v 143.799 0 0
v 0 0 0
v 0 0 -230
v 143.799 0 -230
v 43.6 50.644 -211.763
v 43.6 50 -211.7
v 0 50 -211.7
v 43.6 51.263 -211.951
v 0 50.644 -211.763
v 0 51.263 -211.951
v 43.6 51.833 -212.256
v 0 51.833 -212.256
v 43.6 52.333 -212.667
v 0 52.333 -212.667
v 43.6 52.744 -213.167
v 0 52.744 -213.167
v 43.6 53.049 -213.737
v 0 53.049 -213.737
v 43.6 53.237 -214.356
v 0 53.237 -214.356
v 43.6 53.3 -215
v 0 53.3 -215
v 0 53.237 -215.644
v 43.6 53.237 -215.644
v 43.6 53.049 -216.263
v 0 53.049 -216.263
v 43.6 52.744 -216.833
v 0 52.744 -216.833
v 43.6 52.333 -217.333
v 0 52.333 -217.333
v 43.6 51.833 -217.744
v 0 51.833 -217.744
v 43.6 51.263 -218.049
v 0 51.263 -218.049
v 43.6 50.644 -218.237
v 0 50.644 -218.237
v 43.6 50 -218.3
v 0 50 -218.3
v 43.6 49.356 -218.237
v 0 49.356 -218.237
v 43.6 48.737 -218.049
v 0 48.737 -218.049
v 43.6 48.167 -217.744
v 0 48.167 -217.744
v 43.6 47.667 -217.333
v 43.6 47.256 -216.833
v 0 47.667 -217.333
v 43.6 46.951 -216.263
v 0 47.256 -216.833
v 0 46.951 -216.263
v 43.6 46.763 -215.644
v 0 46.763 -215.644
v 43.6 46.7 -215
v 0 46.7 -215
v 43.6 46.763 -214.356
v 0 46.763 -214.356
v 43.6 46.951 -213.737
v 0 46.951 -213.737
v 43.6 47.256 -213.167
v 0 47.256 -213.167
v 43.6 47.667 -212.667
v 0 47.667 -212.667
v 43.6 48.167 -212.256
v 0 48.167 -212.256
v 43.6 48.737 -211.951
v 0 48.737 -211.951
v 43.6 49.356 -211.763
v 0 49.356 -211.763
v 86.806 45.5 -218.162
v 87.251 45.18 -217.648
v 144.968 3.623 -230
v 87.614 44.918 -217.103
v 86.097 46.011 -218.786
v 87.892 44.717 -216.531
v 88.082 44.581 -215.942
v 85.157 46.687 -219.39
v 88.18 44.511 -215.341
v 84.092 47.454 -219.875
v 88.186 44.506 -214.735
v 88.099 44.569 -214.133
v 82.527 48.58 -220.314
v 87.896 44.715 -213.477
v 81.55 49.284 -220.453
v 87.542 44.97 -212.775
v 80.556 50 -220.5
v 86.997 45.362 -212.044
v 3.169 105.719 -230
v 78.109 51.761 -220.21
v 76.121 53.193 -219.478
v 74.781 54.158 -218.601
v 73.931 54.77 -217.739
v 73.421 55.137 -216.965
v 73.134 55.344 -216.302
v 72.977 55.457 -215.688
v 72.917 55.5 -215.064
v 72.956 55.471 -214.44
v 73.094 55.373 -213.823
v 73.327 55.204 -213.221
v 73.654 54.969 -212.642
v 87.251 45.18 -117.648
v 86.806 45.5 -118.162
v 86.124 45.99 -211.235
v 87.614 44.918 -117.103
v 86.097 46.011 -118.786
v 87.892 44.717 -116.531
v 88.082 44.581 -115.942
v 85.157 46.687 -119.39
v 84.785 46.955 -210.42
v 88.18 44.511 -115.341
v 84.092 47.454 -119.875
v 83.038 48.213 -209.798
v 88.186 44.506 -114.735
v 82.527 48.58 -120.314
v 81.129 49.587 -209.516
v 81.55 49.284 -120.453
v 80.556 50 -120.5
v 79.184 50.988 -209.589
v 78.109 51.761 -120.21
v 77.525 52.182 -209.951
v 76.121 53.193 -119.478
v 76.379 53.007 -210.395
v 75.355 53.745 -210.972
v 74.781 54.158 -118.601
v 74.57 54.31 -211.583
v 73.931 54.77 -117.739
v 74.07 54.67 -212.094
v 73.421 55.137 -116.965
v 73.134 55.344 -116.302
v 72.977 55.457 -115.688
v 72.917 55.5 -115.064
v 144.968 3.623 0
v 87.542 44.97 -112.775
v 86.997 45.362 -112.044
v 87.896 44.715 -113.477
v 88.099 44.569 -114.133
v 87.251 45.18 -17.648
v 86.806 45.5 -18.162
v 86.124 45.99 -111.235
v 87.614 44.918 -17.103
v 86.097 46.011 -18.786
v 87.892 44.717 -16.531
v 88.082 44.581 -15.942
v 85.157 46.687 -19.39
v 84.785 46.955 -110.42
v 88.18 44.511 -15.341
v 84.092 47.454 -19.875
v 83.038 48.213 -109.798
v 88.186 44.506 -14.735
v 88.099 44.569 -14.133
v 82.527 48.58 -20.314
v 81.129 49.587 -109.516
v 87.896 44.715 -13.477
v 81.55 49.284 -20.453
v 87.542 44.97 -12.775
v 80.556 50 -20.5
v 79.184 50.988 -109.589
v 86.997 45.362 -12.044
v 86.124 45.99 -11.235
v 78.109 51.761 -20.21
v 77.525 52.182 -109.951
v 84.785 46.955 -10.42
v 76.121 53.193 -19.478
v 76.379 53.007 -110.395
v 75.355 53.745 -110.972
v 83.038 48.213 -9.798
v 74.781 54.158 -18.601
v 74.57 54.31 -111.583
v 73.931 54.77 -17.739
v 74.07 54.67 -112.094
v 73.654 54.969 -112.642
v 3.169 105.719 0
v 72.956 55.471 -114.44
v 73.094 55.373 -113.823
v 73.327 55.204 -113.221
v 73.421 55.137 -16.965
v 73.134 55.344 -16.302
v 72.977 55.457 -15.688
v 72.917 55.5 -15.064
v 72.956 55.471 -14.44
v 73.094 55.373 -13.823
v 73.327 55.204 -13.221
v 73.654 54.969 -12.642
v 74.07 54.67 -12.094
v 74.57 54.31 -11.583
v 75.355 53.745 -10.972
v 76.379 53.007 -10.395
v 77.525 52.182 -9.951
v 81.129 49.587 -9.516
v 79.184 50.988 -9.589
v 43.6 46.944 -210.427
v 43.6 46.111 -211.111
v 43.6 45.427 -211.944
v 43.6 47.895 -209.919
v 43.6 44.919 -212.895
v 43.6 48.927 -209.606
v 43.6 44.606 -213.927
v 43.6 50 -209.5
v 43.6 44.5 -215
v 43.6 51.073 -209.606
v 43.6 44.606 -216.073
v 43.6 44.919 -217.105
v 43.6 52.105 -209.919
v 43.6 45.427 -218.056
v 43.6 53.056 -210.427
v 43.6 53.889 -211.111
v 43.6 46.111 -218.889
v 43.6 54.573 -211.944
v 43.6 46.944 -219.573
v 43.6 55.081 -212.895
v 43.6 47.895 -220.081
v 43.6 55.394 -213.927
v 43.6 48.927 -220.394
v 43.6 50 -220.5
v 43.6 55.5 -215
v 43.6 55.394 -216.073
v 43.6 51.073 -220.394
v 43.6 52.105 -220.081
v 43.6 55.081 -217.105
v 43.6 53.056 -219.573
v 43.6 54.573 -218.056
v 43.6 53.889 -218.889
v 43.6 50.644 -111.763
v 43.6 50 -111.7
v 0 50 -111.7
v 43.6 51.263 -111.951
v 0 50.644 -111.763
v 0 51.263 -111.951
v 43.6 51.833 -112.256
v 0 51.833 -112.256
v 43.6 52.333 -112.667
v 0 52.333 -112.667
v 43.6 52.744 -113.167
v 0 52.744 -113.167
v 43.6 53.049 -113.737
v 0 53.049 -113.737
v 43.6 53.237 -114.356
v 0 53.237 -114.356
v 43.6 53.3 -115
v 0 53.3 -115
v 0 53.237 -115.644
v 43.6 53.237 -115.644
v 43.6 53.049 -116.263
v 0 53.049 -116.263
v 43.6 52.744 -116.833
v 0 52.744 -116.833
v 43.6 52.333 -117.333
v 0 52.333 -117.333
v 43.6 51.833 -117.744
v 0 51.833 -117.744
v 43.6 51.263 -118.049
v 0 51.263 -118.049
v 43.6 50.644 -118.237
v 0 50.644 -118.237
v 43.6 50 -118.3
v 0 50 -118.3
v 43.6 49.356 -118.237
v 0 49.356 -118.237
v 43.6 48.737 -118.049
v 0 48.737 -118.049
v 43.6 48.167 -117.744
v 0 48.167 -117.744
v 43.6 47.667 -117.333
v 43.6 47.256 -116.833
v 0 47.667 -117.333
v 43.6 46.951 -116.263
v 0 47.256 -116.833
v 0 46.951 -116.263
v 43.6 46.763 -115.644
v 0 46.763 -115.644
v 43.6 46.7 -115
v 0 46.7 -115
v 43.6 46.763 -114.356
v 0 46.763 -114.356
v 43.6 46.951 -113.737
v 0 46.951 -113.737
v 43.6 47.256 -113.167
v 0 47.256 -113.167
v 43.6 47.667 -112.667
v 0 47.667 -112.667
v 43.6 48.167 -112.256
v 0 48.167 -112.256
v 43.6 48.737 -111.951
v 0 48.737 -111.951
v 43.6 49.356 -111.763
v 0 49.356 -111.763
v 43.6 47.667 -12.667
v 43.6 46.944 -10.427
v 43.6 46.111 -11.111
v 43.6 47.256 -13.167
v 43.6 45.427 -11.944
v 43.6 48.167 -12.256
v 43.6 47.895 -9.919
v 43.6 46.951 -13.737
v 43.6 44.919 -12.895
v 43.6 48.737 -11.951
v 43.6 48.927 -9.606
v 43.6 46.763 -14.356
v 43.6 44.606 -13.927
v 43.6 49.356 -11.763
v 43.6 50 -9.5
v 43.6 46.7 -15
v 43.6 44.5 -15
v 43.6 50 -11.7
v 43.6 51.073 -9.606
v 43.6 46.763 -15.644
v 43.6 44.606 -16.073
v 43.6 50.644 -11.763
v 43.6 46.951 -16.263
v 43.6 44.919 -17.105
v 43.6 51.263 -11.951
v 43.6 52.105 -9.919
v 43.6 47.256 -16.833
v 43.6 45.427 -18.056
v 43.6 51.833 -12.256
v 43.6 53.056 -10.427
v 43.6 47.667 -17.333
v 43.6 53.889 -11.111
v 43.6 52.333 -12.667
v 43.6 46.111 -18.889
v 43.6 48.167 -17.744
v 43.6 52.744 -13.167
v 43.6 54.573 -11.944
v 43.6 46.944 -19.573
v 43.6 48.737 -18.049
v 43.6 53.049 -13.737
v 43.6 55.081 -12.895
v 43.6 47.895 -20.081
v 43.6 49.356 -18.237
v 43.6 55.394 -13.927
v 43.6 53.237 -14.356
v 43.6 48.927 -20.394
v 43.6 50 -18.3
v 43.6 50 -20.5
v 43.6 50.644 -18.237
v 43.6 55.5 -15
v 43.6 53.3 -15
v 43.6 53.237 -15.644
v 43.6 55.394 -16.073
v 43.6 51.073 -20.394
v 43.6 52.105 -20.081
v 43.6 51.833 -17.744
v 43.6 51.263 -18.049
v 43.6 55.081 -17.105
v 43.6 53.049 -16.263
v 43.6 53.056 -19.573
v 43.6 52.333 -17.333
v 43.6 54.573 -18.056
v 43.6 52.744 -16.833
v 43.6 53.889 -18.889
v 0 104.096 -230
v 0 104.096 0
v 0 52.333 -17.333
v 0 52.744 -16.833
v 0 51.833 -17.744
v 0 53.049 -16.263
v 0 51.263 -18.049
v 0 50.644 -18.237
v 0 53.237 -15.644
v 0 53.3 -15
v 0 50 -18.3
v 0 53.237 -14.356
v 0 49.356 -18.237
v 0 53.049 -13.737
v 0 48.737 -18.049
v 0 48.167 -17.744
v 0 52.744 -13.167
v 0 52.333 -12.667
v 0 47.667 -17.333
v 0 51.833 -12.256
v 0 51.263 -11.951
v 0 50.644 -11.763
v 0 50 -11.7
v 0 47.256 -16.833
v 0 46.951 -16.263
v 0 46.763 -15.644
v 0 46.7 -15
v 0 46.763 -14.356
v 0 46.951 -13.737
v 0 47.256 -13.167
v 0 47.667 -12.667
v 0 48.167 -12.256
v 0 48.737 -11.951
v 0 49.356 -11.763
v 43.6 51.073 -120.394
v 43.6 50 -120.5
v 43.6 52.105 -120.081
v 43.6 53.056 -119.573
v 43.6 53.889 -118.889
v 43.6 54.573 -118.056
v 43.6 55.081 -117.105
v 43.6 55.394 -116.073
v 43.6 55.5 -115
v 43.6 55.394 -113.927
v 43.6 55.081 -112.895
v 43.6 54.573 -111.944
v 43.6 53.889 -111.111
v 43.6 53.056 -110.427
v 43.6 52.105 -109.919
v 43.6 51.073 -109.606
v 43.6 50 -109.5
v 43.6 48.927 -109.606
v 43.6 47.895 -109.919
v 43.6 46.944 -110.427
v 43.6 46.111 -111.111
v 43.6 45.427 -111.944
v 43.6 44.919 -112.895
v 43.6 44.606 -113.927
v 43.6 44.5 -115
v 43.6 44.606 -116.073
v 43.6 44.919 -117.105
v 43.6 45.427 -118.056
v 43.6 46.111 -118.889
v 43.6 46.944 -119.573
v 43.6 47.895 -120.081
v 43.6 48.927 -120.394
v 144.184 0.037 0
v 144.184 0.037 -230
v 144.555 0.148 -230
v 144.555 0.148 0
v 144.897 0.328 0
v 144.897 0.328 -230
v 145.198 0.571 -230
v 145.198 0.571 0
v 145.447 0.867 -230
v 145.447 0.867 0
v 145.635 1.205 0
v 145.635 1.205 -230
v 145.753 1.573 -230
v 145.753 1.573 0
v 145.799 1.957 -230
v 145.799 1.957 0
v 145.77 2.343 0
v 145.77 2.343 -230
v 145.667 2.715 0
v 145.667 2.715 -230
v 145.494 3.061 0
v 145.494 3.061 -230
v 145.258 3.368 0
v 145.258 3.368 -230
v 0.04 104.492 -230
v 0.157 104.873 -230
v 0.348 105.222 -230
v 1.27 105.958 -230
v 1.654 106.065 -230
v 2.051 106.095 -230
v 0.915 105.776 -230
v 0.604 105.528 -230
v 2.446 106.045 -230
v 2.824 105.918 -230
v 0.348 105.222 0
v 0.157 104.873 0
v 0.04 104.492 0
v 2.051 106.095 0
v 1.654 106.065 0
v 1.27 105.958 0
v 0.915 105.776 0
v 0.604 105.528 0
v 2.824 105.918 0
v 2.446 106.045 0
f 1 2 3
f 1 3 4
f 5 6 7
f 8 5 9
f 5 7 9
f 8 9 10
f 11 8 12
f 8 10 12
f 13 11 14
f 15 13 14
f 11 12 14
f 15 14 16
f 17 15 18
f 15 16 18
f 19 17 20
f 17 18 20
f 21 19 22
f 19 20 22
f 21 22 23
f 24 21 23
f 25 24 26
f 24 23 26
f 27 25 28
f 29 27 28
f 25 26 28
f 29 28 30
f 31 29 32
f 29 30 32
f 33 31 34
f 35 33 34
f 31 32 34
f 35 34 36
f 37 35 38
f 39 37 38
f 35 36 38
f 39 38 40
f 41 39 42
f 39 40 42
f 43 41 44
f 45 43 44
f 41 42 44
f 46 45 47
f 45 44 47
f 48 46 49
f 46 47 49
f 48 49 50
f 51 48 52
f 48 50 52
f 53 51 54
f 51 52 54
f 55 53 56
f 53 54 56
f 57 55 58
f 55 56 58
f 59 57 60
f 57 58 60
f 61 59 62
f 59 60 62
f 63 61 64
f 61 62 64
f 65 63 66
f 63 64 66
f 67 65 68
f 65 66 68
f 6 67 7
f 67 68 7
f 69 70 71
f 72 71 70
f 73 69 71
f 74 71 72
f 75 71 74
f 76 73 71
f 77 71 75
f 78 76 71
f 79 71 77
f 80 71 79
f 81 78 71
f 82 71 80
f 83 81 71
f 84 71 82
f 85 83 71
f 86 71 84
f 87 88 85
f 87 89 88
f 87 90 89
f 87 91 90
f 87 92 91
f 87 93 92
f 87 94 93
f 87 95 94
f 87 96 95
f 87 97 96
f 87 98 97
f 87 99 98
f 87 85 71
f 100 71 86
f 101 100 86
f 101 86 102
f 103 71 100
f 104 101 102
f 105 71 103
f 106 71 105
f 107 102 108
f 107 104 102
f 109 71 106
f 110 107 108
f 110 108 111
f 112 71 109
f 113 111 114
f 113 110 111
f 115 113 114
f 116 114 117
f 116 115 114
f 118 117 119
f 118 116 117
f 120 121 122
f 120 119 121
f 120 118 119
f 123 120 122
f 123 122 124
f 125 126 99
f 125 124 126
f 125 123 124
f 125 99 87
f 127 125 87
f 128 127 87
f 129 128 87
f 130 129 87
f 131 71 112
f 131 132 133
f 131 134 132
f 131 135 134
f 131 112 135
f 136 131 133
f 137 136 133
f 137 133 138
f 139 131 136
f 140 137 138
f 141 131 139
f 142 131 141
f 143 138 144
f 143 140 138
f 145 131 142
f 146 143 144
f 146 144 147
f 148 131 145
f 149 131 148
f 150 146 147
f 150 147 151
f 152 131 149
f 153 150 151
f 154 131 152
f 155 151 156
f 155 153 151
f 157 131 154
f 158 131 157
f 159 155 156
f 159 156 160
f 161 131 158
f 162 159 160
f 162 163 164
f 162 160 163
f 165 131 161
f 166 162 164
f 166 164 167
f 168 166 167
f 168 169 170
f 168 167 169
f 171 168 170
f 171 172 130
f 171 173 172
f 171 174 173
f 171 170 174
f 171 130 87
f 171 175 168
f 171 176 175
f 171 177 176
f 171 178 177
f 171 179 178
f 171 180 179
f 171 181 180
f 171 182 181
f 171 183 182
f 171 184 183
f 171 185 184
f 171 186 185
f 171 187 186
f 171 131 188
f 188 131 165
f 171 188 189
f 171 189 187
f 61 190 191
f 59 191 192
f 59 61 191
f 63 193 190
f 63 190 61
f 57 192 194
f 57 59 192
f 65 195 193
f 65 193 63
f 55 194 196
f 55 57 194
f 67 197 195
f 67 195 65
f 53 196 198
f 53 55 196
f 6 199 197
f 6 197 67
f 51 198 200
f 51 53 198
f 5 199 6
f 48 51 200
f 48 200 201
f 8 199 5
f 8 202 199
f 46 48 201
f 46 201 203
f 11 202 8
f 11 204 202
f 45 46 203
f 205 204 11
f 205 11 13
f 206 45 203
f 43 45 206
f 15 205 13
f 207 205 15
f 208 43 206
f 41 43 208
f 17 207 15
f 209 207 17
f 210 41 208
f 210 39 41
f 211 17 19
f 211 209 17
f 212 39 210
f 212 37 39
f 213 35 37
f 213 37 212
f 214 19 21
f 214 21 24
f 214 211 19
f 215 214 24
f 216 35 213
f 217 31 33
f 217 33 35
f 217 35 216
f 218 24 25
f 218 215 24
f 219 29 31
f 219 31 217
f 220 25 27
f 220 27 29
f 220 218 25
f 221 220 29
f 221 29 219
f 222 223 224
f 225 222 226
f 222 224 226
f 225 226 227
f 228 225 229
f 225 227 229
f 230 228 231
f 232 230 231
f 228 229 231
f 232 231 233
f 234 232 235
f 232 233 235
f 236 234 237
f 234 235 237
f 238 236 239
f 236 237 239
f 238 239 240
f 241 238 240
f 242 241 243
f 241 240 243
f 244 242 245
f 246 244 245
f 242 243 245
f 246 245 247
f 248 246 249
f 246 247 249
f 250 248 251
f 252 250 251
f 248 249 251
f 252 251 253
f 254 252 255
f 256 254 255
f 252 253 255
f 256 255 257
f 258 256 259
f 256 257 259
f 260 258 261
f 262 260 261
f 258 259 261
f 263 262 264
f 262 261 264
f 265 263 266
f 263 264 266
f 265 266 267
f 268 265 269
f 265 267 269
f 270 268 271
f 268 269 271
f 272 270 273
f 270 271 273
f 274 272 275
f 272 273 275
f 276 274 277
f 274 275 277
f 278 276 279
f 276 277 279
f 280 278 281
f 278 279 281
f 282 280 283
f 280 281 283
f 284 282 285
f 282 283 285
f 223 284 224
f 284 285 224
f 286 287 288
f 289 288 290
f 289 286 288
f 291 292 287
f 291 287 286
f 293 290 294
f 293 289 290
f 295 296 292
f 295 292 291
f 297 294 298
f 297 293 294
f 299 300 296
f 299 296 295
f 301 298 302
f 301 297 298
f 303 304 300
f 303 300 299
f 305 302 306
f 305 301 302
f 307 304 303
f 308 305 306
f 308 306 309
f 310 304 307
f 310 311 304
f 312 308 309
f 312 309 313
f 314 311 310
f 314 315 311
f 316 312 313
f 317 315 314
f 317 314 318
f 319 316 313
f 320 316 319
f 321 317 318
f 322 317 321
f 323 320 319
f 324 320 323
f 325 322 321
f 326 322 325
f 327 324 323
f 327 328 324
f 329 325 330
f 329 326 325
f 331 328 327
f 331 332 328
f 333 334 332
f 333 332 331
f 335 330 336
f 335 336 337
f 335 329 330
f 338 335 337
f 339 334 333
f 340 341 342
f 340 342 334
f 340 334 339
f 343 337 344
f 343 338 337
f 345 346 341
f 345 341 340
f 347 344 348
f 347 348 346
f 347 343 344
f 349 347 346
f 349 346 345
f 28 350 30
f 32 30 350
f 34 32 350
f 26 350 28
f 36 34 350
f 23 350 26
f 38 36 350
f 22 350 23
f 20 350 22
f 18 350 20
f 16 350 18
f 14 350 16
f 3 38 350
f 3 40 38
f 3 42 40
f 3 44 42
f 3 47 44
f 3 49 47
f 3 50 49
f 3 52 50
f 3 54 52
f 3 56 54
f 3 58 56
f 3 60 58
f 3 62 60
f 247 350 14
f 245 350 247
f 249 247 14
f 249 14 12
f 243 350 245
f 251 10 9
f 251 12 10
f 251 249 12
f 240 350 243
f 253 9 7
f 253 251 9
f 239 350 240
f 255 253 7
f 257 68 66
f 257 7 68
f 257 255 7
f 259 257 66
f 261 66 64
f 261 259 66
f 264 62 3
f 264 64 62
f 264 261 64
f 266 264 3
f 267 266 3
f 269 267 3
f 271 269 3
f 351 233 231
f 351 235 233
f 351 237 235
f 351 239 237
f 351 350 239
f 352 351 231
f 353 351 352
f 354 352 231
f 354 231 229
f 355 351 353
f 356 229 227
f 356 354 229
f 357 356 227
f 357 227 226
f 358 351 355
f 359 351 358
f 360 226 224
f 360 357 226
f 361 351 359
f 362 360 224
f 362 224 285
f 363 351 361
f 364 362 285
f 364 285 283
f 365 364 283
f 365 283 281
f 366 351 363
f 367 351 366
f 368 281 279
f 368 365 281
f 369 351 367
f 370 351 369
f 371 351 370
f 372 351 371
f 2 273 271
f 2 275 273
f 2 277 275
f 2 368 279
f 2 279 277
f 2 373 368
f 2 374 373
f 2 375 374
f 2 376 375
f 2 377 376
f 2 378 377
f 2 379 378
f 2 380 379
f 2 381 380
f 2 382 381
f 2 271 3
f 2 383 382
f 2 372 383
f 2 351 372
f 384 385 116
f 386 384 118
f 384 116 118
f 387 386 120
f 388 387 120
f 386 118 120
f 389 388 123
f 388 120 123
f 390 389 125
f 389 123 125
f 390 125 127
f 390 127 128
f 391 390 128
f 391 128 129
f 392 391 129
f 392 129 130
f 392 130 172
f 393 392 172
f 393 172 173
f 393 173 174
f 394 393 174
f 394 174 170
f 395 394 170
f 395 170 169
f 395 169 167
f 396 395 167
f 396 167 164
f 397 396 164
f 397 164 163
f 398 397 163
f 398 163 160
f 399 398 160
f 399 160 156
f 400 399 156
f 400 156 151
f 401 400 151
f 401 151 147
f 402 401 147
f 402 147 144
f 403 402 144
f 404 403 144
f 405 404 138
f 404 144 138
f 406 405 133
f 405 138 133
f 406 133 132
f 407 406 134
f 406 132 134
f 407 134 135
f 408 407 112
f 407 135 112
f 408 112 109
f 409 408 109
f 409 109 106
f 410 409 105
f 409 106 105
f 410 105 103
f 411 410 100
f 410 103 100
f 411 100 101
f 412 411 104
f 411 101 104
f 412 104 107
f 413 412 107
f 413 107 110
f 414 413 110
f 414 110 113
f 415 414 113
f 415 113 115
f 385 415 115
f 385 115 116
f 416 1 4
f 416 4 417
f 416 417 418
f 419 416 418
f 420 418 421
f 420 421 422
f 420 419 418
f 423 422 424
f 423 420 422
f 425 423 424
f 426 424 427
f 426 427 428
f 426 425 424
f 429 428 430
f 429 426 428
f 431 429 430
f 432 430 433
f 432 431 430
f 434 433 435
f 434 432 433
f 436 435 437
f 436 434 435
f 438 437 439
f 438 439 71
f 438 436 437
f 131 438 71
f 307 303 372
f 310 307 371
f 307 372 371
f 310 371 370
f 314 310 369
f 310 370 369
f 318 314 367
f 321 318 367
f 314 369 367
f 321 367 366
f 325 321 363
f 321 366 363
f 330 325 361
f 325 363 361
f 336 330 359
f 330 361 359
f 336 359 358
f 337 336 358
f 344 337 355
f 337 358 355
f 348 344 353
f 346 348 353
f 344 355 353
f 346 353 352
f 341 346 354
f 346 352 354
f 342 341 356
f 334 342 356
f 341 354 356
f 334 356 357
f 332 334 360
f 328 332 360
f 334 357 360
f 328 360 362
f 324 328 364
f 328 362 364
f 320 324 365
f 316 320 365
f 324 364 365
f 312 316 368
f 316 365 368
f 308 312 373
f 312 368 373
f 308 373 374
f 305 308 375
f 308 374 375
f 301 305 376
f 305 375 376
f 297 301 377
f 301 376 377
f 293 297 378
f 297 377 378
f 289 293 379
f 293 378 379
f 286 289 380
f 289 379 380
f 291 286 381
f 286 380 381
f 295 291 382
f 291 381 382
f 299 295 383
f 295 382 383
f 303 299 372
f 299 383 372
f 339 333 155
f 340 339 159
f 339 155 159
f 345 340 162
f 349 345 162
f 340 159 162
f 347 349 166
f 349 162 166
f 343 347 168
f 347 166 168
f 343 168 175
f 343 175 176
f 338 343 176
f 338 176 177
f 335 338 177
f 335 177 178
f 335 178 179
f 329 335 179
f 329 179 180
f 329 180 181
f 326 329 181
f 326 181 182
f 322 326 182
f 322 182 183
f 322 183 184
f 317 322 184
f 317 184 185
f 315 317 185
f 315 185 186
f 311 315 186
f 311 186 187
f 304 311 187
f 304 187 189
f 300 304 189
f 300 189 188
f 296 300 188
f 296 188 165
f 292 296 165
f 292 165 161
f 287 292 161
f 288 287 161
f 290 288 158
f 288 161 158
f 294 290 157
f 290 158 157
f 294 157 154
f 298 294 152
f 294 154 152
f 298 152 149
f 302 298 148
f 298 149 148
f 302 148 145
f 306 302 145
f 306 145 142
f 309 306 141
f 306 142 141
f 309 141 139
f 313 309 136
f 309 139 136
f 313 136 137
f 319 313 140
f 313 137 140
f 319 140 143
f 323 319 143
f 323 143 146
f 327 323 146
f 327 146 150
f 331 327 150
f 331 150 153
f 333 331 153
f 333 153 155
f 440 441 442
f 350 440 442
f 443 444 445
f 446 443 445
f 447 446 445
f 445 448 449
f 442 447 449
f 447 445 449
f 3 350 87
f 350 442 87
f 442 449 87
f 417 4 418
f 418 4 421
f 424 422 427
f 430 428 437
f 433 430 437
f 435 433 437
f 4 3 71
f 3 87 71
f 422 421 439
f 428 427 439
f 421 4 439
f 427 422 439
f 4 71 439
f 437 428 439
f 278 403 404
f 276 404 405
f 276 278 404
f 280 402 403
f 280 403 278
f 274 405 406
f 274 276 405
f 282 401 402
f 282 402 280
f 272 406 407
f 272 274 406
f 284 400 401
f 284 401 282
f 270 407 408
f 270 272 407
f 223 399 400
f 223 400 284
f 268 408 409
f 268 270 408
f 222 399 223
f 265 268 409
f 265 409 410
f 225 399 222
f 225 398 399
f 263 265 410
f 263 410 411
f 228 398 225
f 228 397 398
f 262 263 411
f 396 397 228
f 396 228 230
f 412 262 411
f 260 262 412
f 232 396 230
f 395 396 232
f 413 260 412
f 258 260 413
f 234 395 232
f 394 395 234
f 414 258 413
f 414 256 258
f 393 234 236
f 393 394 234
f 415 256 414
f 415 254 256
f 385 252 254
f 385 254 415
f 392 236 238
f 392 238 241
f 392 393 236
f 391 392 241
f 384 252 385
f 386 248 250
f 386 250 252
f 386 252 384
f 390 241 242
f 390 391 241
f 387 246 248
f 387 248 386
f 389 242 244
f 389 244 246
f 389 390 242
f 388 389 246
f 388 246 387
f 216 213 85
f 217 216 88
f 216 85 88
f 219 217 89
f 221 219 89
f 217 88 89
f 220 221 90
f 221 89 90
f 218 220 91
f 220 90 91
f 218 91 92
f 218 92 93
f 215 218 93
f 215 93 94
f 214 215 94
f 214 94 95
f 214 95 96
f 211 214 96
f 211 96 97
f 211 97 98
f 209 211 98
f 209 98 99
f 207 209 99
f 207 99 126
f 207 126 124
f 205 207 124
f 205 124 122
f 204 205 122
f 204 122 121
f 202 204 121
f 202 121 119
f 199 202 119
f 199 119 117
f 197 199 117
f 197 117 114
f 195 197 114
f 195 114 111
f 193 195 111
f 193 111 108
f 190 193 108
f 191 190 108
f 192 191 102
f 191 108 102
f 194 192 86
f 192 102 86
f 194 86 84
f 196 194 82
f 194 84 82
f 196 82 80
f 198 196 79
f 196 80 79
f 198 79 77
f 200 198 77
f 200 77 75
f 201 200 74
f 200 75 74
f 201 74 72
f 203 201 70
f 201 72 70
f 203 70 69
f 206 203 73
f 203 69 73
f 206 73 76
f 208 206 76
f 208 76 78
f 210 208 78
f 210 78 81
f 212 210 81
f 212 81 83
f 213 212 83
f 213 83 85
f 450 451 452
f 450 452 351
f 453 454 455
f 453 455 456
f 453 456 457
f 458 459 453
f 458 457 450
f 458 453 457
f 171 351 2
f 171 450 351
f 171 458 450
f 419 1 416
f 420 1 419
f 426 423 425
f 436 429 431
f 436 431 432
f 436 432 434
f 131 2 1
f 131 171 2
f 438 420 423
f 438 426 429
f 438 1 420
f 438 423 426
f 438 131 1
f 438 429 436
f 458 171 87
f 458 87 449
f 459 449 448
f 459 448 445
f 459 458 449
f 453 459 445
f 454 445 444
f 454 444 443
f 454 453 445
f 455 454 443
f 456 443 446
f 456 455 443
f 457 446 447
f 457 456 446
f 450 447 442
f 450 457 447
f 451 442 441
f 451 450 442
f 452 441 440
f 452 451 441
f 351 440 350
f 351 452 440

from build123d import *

# Parameters (mm, degrees)
AUFSATZ_LINEAR_AUSTRAGEN1_DEPTH                      = 230
STIRNSENKUNG_F_R_M6_ZYLINDERSCHRAUBE_MIT_D           = 6.6
STIRNSENKUNG_F_R_M6_ZYLINDERSCHRAUBE_MIT_CBORE_D     = 11
STIRNSENKUNG_F_R_M6_ZYLINDERSCHRAUBE_MIT_CBORE_DEPTH = 106.4


with BuildPart() as part:
    # Skizze1 → Aufsatz-Linear austragen1 (new body)
    with BuildSketch(Plane.XY):
        with BuildLine():
            Line((0, 104.095532512), (0, 0))
            Line((0, 0), (143.799350711, 0))
            ThreePointArc((143.799350711, 0), (145.702786731, 1.386052676), (144.967960163, 3.623068683))
            Line((144.967960163, 3.623068683), (3.168609452, 105.718601195))
            ThreePointArc((3.168609452, 105.718601195), (1.088193799, 105.875591346), (0, 104.095532512))
        make_face()
    extrude(amount=-AUFSATZ_LINEAR_AUSTRAGEN1_DEPTH)

    # Stirnsenkung für M6 Zylinderschraube mit Innensechskant1 (through all)
    with Locations(Plane(origin=(150, 0, 0), x_dir=(0, 0, -1), z_dir=(1, 0, 0))):
        with Locations((15, 50), (115, 50), (215, 50)):
            CounterBoreHole(STIRNSENKUNG_F_R_M6_ZYLINDERSCHRAUBE_MIT_D / 2, STIRNSENKUNG_F_R_M6_ZYLINDERSCHRAUBE_MIT_CBORE_D / 2, STIRNSENKUNG_F_R_M6_ZYLINDERSCHRAUBE_MIT_CBORE_DEPTH)


solid = part.part
